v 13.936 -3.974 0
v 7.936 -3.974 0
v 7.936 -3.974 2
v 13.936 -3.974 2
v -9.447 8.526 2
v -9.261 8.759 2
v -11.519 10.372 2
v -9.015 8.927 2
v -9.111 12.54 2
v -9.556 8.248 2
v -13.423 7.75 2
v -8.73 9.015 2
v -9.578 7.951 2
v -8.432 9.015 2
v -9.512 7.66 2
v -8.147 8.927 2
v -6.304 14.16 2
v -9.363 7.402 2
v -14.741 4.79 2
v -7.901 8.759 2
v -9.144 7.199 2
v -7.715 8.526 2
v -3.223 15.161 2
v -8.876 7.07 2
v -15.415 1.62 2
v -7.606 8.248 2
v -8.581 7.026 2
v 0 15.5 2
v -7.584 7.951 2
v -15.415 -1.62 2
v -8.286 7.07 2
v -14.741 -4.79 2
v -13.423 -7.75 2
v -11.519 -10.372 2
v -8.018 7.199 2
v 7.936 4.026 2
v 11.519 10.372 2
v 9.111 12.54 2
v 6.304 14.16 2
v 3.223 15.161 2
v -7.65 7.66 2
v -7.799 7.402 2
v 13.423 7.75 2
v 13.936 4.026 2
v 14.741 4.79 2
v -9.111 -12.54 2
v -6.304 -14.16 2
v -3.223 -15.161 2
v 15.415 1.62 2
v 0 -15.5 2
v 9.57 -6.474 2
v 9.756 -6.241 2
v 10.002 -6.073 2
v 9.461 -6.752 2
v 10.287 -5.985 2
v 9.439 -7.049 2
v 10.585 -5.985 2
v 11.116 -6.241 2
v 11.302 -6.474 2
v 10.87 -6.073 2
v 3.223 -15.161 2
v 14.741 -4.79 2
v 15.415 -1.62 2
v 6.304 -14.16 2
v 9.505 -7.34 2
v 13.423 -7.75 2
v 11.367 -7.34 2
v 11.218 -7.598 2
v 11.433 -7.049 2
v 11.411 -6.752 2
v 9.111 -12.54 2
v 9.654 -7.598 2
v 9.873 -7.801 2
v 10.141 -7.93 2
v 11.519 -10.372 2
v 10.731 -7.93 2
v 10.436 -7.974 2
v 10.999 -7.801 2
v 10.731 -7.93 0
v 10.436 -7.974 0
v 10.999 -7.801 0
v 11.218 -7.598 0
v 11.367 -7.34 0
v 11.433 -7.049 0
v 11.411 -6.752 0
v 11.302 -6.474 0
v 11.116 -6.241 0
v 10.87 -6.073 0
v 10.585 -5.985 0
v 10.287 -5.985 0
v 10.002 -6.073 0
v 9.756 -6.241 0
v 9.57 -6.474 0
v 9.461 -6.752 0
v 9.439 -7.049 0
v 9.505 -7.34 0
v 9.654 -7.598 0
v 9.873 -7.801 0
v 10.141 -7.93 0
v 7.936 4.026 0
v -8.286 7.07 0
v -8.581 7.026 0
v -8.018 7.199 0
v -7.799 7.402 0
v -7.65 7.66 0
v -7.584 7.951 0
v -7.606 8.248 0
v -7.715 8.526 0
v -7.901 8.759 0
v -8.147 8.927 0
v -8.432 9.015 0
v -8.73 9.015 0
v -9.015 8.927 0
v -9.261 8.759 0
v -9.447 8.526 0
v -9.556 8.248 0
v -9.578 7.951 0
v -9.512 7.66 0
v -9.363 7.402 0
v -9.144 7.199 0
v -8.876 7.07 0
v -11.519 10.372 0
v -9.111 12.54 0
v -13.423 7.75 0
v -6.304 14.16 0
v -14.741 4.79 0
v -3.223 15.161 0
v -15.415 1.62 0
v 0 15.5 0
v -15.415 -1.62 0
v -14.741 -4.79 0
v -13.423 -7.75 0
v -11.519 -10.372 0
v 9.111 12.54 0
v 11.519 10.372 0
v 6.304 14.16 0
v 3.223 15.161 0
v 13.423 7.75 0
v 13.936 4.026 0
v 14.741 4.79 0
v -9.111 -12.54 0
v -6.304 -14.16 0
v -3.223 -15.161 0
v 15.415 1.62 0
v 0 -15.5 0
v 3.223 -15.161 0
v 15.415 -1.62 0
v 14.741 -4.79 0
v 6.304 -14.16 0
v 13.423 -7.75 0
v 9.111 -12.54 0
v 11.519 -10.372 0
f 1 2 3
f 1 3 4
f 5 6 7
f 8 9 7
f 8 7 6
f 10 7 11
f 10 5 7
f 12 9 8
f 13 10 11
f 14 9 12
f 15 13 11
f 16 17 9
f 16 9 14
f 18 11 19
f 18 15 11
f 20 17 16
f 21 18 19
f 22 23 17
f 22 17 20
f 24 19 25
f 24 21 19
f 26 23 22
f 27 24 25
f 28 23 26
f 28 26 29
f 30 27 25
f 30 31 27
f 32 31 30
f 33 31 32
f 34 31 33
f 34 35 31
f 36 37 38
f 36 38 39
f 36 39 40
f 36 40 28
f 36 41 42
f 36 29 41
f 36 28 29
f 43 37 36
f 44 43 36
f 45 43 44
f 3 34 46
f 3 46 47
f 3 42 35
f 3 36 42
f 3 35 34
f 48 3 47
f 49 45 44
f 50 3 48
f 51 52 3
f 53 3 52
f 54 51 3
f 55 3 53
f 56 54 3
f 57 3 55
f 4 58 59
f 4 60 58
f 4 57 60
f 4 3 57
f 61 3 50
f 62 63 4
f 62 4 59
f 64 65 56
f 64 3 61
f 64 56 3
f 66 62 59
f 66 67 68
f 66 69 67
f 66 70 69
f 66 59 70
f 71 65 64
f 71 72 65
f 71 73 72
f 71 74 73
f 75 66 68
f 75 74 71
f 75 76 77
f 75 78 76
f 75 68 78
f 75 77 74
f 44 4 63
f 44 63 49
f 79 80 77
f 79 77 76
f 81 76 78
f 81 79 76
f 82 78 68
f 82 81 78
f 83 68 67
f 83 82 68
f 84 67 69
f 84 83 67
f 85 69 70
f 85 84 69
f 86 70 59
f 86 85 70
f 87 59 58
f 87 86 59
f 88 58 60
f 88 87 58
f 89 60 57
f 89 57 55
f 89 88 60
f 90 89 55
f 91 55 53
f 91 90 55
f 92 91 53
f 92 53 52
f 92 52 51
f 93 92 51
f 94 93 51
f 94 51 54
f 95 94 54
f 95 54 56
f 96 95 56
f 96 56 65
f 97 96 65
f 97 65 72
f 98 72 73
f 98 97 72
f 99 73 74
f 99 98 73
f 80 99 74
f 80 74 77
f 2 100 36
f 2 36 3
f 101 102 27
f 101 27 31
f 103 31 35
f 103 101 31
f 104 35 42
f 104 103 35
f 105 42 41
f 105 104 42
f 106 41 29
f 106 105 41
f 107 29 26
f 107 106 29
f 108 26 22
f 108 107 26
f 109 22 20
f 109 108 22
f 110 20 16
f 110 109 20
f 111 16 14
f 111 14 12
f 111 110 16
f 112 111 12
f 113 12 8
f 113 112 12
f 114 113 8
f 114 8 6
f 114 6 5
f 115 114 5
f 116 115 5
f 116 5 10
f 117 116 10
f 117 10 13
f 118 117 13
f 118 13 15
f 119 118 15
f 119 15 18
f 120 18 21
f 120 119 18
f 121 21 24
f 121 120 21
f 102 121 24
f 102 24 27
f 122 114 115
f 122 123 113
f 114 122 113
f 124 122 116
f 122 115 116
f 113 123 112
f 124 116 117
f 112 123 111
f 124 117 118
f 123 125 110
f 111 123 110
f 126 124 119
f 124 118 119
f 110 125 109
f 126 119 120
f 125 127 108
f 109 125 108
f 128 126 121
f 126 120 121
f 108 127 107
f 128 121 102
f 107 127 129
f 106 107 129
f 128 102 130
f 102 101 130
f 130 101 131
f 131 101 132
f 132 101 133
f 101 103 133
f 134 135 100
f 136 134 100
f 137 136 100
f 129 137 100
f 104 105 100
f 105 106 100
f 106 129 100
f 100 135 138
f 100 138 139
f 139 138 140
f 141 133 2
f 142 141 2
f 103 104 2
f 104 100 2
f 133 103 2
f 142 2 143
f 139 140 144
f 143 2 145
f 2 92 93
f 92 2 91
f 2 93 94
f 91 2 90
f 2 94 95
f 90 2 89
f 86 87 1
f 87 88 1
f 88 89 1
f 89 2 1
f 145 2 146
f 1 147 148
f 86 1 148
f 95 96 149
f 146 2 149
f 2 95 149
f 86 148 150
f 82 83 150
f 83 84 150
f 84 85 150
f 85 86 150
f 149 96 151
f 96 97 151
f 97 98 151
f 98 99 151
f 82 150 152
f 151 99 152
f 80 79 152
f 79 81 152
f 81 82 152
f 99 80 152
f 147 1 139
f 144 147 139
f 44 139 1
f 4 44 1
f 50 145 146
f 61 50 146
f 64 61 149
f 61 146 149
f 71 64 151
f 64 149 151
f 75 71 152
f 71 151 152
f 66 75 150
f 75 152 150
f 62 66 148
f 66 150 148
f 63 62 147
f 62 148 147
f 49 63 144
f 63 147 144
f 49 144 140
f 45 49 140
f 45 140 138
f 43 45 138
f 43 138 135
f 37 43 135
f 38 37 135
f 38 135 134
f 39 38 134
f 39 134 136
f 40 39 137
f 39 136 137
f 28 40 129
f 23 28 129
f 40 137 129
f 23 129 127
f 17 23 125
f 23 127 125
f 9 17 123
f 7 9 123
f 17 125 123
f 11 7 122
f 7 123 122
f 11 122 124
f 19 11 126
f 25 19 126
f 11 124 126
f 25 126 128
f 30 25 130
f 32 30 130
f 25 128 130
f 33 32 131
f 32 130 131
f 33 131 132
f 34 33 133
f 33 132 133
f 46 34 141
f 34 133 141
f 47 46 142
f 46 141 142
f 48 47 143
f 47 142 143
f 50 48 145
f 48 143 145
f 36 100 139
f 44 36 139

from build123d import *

# Parameters (mm, degrees)
SKETCH1_R           = 15.5
SKETCH1_R_2         = 1
SKETCH1_W           = 8
SKETCH1_H           = 6
BOSS_EXTRUDE1_DEPTH = 2


with BuildPart() as part:
    # Sketch1 → Boss-Extrude1 (new body)
    with BuildSketch(Plane(origin=(0, 0, 0), x_dir=(0, -1, 0), z_dir=(0, 0, 1))):
        Circle(SKETCH1_R)
        with Locations((6.97426488, 10.435972737)):
            Circle(SKETCH1_R_2, mode=Mode.SUBTRACT)
        with Locations((-8.02573512, -8.580948715)):
            Circle(SKETCH1_R_2, mode=Mode.SUBTRACT)
        with Locations((-0.025715642, 10.93618237)):
            Rectangle(SKETCH1_W, SKETCH1_H, mode=Mode.SUBTRACT)
    extrude(amount=BOSS_EXTRUDE1_DEPTH)


solid = part.part
